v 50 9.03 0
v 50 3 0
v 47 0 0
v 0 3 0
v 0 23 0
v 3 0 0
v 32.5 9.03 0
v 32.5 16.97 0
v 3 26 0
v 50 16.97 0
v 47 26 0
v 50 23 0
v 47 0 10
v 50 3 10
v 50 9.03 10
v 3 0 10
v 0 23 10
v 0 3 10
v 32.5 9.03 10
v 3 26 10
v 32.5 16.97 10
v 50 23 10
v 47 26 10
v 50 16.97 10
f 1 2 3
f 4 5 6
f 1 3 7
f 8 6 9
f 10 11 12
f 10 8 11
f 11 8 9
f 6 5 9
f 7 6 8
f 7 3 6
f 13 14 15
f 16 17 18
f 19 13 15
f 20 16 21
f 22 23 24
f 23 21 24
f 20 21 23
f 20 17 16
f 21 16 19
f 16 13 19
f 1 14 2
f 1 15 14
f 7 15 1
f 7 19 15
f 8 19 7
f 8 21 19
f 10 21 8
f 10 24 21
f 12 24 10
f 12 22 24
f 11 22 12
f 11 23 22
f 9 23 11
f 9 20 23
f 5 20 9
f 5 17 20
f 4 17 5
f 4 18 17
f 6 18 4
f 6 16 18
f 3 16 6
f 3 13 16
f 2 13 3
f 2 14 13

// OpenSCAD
$fn = 32;

// ----------------------------------------------------------------------
// C washer: 50 x 26 mm plate with an open slot
// ----------------------------------------------------------------------

// --- parameters (mm) ---
profile_height = 10;      // extrusion height
profile_points = 12;      // points of the closed outline

profile = [[3, 0], [47, 0], [50, 3], [50, 9.03], [32.5, 9.03], [32.5, 16.97], [50, 16.97], [50, 23], [47, 26], [3, 26], [0, 23], [0, 3]];  // single closed polygon, 12 points, counter clockwise

// --- the one profile operation ---
linear_extrude(height = profile_height) polygon(points = profile);
